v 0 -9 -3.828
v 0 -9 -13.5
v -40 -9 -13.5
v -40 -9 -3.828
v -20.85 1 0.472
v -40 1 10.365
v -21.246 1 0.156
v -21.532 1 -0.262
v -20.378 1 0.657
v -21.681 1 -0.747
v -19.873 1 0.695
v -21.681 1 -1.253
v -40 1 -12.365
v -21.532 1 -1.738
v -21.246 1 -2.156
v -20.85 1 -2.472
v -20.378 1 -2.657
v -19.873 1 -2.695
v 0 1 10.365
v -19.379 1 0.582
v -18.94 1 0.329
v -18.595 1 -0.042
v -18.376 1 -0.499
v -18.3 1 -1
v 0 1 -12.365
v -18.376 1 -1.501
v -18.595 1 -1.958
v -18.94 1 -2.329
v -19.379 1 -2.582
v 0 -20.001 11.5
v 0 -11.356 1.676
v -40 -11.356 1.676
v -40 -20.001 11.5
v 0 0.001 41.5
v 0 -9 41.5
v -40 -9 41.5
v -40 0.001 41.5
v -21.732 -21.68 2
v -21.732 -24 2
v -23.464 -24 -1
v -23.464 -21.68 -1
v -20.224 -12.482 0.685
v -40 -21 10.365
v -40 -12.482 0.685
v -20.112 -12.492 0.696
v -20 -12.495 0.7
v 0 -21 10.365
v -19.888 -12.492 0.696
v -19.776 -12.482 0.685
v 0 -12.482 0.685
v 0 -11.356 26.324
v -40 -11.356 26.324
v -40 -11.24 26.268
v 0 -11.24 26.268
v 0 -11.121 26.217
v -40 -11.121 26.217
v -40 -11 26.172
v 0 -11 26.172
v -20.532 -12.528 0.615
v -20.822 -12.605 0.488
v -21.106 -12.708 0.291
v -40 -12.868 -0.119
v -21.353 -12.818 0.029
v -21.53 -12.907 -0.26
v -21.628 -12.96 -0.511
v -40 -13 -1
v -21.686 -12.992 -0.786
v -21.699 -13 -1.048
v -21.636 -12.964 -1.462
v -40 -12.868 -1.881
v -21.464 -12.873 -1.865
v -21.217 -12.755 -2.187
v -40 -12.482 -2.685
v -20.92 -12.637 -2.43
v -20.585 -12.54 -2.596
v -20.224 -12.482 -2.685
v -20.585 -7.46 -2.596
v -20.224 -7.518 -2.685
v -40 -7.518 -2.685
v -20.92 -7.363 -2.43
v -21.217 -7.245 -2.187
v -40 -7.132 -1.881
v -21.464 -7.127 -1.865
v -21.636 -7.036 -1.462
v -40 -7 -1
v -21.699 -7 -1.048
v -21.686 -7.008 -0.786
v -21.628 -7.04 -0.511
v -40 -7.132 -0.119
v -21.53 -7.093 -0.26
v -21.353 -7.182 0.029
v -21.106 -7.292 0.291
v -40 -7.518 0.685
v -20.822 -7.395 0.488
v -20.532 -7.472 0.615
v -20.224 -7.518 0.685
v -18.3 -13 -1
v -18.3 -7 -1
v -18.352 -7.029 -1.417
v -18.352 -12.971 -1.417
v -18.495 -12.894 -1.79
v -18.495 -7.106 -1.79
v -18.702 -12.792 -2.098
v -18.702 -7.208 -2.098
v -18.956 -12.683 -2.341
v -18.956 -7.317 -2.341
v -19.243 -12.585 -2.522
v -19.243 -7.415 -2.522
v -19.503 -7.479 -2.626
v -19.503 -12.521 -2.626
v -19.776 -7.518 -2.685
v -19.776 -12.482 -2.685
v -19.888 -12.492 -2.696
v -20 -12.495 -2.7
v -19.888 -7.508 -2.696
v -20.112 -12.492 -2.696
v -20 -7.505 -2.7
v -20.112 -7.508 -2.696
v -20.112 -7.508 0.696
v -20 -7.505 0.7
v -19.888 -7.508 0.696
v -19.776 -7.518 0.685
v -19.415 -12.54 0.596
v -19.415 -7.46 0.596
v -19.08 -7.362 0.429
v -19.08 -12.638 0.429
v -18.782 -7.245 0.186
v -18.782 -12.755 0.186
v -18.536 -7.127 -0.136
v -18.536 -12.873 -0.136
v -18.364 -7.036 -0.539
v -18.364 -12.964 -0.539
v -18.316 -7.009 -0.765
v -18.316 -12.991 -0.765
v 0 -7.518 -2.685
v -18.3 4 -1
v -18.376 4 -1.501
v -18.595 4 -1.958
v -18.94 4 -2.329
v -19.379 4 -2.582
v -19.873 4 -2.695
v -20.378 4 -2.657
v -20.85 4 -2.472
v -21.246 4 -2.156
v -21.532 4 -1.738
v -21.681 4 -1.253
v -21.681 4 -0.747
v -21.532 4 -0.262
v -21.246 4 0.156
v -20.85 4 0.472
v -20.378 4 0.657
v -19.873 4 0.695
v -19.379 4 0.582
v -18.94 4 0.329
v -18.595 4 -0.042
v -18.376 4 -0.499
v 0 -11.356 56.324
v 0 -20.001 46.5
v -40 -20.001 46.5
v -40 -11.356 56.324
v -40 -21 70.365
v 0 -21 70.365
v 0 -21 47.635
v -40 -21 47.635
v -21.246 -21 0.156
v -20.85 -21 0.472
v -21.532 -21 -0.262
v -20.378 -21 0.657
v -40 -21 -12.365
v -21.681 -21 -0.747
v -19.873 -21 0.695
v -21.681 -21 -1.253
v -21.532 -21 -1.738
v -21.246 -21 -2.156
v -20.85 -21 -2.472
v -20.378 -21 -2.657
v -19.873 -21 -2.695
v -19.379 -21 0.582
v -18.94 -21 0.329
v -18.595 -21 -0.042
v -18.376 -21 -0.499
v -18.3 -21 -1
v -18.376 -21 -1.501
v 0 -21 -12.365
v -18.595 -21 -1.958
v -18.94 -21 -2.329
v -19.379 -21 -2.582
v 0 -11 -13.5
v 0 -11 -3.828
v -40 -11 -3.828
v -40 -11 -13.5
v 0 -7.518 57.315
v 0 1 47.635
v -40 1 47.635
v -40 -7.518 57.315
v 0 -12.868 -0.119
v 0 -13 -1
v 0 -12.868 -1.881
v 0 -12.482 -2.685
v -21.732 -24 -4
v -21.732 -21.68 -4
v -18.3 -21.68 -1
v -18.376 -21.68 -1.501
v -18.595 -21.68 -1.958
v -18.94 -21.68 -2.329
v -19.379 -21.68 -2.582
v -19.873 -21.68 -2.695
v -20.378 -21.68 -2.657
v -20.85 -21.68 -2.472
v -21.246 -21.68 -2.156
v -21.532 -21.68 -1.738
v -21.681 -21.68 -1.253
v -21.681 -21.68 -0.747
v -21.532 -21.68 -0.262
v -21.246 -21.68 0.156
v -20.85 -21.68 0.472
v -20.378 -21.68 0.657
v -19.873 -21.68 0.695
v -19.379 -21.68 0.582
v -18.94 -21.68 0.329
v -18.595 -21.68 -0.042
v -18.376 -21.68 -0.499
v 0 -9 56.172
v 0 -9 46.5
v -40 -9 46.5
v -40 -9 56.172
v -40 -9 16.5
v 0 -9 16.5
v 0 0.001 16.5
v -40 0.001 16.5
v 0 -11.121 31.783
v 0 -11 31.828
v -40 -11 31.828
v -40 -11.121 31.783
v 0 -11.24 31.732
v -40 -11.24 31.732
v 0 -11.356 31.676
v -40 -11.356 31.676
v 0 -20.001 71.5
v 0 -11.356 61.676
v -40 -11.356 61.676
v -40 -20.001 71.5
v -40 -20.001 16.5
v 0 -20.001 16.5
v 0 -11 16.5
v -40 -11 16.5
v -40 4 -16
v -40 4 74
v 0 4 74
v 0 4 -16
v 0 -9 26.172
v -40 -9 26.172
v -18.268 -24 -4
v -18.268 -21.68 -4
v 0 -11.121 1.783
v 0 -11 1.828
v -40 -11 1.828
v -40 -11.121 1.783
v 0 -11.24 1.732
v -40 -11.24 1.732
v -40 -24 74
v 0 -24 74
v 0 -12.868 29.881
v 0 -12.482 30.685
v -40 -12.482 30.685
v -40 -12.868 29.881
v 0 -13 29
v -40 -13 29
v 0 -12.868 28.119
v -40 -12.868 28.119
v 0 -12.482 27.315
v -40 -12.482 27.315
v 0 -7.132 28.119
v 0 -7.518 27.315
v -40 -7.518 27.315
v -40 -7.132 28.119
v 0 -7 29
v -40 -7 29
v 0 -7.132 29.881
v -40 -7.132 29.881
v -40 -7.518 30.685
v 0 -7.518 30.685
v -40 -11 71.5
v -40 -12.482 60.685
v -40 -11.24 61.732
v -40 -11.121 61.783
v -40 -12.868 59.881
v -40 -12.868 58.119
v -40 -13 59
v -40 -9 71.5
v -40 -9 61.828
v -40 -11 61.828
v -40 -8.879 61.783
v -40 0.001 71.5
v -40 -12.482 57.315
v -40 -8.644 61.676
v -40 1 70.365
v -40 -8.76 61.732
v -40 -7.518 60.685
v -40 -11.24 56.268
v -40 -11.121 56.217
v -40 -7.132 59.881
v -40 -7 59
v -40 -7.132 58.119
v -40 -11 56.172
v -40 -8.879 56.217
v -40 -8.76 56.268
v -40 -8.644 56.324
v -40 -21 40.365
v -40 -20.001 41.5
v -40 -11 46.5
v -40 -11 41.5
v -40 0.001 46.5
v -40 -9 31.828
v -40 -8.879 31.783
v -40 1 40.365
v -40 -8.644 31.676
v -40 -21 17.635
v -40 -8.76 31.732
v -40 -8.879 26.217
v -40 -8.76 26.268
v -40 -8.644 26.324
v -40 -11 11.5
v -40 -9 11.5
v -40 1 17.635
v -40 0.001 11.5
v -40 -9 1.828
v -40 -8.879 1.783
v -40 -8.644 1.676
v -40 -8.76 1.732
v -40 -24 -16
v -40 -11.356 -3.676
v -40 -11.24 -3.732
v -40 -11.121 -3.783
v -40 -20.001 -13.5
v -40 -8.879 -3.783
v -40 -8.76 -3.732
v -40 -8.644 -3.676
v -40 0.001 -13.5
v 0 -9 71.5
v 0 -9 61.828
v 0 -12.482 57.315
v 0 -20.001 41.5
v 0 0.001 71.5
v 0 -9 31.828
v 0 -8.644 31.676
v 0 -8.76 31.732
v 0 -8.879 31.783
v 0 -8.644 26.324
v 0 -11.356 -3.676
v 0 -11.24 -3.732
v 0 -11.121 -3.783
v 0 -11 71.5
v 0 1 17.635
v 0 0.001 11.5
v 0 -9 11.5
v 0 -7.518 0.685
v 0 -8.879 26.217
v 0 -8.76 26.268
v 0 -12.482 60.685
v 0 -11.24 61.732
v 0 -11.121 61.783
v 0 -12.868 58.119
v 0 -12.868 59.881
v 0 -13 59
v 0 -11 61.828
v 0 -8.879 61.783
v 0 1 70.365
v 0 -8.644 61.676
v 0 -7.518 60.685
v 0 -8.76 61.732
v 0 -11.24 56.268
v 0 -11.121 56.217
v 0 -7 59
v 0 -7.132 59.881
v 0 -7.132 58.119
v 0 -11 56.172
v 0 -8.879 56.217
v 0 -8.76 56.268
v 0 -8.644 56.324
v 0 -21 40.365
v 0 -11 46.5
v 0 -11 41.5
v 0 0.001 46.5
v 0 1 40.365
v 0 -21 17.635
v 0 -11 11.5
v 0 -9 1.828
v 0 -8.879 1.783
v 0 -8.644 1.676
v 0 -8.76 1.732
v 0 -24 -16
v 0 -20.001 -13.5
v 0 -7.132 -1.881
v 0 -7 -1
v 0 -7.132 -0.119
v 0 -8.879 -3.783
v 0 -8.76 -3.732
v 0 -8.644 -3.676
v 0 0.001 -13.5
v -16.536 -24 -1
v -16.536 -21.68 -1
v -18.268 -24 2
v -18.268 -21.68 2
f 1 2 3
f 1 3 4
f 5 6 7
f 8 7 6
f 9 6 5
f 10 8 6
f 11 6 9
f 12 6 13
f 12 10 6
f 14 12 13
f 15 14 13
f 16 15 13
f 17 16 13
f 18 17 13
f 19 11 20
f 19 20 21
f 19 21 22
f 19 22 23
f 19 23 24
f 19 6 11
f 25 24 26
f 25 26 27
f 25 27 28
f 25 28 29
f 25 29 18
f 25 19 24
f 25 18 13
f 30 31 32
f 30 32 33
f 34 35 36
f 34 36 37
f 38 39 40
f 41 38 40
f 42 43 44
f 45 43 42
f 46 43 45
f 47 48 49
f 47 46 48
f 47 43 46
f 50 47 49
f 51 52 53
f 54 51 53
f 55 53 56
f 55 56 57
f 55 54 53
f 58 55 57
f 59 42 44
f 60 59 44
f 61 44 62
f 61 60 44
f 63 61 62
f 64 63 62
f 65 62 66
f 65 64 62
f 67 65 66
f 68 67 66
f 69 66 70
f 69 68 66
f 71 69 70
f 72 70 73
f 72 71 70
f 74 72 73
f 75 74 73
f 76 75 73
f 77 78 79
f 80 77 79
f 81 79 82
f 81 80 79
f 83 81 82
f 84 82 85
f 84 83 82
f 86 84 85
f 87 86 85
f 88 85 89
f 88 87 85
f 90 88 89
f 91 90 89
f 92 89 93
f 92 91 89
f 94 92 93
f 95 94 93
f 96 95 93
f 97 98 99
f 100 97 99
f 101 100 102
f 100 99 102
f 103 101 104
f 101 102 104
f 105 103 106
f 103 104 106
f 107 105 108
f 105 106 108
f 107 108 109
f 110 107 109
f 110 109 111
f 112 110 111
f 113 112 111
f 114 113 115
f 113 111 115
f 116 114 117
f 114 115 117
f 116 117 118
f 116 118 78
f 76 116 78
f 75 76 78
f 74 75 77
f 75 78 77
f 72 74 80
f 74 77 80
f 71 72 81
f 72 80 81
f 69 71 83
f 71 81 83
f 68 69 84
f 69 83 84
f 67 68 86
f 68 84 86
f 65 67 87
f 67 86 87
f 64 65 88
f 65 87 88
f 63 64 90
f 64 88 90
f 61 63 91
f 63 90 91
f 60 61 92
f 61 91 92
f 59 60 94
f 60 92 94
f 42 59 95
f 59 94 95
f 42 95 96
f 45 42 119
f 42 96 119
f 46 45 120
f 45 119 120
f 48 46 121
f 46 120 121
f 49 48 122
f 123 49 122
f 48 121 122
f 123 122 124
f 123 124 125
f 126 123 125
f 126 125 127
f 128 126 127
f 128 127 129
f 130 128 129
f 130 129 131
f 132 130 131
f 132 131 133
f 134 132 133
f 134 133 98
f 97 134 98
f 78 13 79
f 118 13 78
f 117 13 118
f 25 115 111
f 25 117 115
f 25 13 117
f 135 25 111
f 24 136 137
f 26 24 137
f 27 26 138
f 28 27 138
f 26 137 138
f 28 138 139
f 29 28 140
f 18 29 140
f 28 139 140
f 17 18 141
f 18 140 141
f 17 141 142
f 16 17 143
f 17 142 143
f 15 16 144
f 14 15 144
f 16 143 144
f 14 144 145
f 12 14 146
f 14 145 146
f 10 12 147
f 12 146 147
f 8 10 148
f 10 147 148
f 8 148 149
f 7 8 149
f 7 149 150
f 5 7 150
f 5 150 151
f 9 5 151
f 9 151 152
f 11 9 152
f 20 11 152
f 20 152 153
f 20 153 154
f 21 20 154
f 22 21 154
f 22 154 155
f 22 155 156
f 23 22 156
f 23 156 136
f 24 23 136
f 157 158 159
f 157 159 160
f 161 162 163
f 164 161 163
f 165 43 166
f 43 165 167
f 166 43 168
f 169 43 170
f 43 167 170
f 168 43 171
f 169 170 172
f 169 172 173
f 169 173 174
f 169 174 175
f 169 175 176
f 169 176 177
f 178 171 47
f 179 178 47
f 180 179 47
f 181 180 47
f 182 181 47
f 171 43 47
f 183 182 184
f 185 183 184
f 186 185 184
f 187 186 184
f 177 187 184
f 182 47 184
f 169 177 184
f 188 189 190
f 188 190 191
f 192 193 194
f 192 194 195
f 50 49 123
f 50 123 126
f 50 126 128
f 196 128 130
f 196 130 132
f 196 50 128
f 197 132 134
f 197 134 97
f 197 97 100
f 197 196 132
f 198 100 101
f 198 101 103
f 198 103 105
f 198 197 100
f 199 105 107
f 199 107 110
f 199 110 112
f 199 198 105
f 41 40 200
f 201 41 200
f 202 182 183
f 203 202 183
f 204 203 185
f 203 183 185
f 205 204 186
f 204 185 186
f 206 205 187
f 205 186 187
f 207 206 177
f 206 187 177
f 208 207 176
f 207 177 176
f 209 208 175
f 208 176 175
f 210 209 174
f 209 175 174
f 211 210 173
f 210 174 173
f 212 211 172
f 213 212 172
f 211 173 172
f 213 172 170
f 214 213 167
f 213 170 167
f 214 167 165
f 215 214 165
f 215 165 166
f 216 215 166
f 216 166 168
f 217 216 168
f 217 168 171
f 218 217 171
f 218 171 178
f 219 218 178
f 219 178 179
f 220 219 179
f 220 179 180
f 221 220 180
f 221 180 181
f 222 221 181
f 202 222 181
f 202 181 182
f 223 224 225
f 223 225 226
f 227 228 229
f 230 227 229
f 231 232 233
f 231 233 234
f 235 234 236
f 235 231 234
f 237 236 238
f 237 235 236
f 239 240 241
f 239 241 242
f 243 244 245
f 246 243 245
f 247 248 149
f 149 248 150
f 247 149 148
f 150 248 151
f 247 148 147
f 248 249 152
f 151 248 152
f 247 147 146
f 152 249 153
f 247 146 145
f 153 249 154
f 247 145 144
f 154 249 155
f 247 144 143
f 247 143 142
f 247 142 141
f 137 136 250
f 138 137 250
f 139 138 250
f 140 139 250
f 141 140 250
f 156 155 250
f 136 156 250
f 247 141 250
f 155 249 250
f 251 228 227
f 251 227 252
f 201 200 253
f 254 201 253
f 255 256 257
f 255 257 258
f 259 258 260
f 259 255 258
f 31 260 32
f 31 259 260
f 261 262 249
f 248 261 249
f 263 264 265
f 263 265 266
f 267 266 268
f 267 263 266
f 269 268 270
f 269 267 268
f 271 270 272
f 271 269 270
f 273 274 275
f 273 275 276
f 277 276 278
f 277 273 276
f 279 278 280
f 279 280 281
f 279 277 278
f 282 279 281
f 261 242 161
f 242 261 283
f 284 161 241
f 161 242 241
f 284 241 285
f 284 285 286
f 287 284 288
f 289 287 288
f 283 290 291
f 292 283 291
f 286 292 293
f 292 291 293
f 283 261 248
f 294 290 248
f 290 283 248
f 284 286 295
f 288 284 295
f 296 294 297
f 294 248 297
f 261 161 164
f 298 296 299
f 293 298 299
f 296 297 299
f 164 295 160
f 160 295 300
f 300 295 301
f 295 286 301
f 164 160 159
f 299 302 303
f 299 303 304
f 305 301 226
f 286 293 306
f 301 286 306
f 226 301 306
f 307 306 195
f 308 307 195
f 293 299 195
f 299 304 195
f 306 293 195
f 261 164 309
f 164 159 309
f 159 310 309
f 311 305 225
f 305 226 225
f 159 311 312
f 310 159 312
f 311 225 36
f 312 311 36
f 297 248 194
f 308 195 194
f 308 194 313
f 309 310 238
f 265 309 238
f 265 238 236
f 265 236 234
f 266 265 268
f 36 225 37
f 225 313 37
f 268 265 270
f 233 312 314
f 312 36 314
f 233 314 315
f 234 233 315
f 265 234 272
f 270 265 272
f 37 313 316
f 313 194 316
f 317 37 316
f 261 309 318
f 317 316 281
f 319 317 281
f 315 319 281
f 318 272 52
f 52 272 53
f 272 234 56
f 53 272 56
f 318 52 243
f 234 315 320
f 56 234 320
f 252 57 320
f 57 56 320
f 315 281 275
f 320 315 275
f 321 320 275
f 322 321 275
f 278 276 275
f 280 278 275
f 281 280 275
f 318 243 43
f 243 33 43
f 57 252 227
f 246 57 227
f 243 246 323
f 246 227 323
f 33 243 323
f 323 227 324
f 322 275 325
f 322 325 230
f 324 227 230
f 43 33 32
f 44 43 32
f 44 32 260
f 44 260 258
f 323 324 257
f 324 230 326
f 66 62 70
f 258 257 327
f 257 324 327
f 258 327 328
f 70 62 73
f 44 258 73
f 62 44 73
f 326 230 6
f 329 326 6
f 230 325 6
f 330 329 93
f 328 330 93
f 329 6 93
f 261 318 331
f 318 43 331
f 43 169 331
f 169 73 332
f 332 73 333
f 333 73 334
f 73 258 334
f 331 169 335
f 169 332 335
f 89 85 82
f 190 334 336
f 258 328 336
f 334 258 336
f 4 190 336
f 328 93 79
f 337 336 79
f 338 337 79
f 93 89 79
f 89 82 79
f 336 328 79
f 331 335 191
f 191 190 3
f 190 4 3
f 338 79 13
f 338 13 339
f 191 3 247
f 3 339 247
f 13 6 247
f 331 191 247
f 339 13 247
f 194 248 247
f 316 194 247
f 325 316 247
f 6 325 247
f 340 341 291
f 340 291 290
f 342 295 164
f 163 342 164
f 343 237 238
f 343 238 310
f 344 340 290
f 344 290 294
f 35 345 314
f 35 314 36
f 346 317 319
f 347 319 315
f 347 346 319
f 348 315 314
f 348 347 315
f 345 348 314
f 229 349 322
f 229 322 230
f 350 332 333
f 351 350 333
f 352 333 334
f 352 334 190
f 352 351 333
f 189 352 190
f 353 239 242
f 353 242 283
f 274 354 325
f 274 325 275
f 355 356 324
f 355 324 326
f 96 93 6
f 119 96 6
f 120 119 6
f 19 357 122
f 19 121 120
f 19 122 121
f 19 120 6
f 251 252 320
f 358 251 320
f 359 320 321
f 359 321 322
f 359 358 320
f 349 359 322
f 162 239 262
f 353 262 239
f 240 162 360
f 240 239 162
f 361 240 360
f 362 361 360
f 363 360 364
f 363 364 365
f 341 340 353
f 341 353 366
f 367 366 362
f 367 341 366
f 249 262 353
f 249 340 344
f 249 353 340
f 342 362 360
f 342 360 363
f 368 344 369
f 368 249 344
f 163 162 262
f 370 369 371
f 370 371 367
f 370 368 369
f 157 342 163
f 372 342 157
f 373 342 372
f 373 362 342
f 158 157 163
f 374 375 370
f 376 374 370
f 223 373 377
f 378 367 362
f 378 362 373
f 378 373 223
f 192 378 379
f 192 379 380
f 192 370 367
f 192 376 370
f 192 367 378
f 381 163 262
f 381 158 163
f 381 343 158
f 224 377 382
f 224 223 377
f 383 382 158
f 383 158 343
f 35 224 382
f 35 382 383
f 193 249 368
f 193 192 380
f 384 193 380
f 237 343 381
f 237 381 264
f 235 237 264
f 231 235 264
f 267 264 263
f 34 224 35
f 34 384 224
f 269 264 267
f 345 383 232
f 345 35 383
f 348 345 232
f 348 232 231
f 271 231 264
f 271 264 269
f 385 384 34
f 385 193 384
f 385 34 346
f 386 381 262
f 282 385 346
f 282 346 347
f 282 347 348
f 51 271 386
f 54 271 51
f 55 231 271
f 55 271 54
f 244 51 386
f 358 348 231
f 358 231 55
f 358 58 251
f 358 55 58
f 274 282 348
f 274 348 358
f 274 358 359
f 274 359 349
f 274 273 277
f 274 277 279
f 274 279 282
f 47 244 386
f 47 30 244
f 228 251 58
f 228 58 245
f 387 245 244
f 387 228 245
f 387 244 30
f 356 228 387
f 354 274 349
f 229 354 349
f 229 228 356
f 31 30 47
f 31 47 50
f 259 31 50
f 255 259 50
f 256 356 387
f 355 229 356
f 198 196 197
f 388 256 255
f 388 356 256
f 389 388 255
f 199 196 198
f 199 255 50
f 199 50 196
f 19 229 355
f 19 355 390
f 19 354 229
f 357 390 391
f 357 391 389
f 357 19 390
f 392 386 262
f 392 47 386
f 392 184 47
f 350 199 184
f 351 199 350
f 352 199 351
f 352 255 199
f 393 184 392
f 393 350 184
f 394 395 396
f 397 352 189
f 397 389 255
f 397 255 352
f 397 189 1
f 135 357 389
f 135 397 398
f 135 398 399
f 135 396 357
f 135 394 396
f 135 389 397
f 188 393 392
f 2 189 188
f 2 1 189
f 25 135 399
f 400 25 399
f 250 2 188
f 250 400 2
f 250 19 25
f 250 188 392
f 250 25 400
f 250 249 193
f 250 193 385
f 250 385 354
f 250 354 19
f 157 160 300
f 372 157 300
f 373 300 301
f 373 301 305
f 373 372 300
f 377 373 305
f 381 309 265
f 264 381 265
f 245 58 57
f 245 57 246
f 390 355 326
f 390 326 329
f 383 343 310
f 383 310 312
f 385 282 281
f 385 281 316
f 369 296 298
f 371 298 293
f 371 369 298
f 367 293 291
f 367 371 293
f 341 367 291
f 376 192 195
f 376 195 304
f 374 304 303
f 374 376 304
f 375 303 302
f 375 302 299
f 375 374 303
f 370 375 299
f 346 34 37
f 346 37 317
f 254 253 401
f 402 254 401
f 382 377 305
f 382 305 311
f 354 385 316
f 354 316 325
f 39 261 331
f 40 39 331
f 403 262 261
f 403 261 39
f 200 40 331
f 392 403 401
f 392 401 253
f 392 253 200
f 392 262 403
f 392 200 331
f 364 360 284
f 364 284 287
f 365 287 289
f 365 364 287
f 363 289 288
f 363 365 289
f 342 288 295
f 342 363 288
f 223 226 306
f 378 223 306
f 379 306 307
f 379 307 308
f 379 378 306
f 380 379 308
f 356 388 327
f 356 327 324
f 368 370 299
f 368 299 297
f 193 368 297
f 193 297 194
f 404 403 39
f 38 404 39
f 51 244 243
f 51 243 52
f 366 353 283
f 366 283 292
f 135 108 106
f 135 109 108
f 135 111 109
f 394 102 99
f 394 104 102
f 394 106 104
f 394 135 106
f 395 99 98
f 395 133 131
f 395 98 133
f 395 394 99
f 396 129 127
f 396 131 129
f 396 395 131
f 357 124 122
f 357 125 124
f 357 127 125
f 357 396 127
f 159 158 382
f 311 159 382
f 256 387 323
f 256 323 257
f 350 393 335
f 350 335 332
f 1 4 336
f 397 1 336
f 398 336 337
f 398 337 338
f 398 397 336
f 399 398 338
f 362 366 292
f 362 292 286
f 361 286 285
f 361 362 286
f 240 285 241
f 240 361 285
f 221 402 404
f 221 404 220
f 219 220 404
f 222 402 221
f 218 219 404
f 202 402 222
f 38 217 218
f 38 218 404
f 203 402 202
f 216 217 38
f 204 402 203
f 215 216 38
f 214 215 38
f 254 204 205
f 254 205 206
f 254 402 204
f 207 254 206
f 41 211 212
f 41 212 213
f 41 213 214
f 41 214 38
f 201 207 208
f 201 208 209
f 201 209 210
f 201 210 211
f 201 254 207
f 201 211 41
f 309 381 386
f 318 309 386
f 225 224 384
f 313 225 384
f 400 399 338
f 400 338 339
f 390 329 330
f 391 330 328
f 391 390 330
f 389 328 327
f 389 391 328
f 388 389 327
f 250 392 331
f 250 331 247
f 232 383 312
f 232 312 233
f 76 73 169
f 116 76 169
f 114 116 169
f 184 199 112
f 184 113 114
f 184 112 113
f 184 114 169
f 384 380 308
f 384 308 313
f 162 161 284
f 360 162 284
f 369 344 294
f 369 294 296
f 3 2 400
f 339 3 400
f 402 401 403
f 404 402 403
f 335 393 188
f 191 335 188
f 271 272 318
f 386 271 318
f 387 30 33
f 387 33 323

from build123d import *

# Parameters (mm, degrees)
SKETCH19_W          = 30
SKETCH19_H          = 28
SKETCH19_W_2        = 25
SKETCH19_H_2        = 22
BOSS_EXTRUDE1_DEPTH = 40
BOSS_EXTRUDE2_DEPTH = 40
LPATTERN2_COUNT     = 3
LPATTERN2_PITCH     = 30
SKETCH22_R          = 1.7
CUT_EXTRUDE1_DEPTH  = 29
CUT_EXTRUDE2_DEPTH  = 2.32


with BuildPart() as part:
    # Sketch19 → Boss-Extrude1 (new body)
    with BuildSketch(Plane(origin=(0, 0, 0), x_dir=(0, 0, -1), z_dir=(1, 0, 0))):
        with Locations((1, -10)):
            Rectangle(SKETCH19_W, SKETCH19_H)
        with Locations((1, -10)):
            Rectangle(SKETCH19_W_2, SKETCH19_H_2, mode=Mode.SUBTRACT)
    extrude(amount=-BOSS_EXTRUDE1_DEPTH)

    # Sketch21 → Boss-Extrude2 (add)
    with BuildSketch(Plane(origin=(0, 0, 0), x_dir=(0, 0, -1), z_dir=(1, 0, 0))):
        with BuildLine():
            Line((-11.995470921, 0.436964862), (-1.676096633, -8.644084511))
            ThreePointArc((-1.676096633, -8.644084511), (-1.252140551, -8.018116315), (-0.68515479, -7.518014236))
            Line((-0.68515479, -7.518014236), (-11.004529079, 1.563035138))
            Line((-11.004529079, 1.563035138), (-11.995470921, 0.436964862))
        make_face()
        with BuildLine():
            Line((13.004529079, 1.563035138), (2.68515479, -7.518014236))
            ThreePointArc((2.68515479, -7.518014236), (3.252140551, -8.018116315), (3.676096633, -8.644084511))
            Line((3.676096633, -8.644084511), (13.995470921, 0.436964862))
            Line((13.995470921, 0.436964862), (13.004529079, 1.563035138))
        make_face()
        with BuildLine():
            Line((-1.828427125, -9), (-11.5, -9))
            Line((-11.5, -9), (-11.5, -11))
            Line((-11.5, -11), (-1.828427125, -11))
            ThreePointArc((-1.828427125, -11), (-2, -10), (-1.828427125, -9))
        make_face()
        with BuildLine():
            Line((13.5, -9), (3.828427125, -9))
            ThreePointArc((3.828427125, -9), (3.956795679, -9.492694064), (4, -10))
            ThreePointArc((4, -10), (3.956795679, -10.507305936), (3.828427125, -11))
            Line((3.828427125, -11), (13.5, -11))
            Line((13.5, -11), (13.5, -9))
        make_face()
        with BuildLine():
            ThreePointArc((-0.68515479, -12.481985764), (-1.252140551, -11.981883685), (-1.676096633, -11.355915489))
            Line((-1.676096633, -11.355915489), (-11.995470921, -20.436964862))
            Line((-11.995470921, -20.436964862), (-11.004529079, -21.563035138))
            Line((-11.004529079, -21.563035138), (-0.68515479, -12.481985764))
        make_face()
        with BuildLine():
            ThreePointArc((3.676096633, -11.355915489), (3.252140551, -11.981883685), (2.68515479, -12.481985764))
            Line((2.68515479, -12.481985764), (13.004529079, -21.563035138))
            Line((13.004529079, -21.563035138), (13.995470921, -20.436964862))
            Line((13.995470921, -20.436964862), (3.676096633, -11.355915489))
        make_face()
        with BuildLine():
            Line((-1.271647214, -9), (-1.828427125, -9))
            ThreePointArc((-1.828427125, -9), (-2, -10), (-1.828427125, -11))
            Line((-1.828427125, -11), (-1.271647214, -11))
            Line((-1.271647214, -11), (-0.135283578, -10))
            Line((-0.135283578, -10), (-1.271647214, -9))
        make_face()
        with BuildLine():
            Line((3.828427125, -9), (3.271647214, -9))
            Line((3.271647214, -9), (2.135283578, -10))
            Line((2.135283578, -10), (3.271647214, -11))
            Line((3.271647214, -11), (3.828427125, -11))
            ThreePointArc((3.828427125, -11), (3.956795679, -10.507305936), (4, -10))
            ThreePointArc((4, -10), (3.956795679, -9.492694064), (3.828427125, -9))
        make_face()
        with BuildLine():
            ThreePointArc((-1.676096633, -8.644084511), (-1.758009138, -8.81958245), (-1.828427125, -9))
            Line((-1.828427125, -9), (-1.271647214, -9))
            Line((-1.271647214, -9), (-1.676096633, -8.644084511))
        make_face()
        with BuildLine():
            Line((-1.676096633, -8.644084511), (-1.271647214, -9))
            Line((-1.271647214, -9), (0.998919941, -9))
            Line((0.998919941, -9), (-0.68515479, -7.518014236))
            ThreePointArc((-0.68515479, -7.518014236), (-1.252140551, -8.018116315), (-1.676096633, -8.644084511))
        make_face()
        Polygon((0.998919941, -9), (-1.271647214, -9), (-0.135283578, -10), (1, -9.000950452), align=None)
        with BuildLine():
            Line((-1.271647214, -11), (-1.828427125, -11))
            ThreePointArc((-1.828427125, -11), (-1.758009138, -11.18041755), (-1.676096633, -11.355915489))
            Line((-1.676096633, -11.355915489), (-1.271647214, -11))
        make_face()
        with BuildLine():
            Line((-0.68515479, -7.518014236), (0.998919941, -9))
            Line((0.998919941, -9), (1.001080059, -9))
            Line((1.001080059, -9), (2.68515479, -7.518014236))
            ThreePointArc((2.68515479, -7.518014236), (1, -7), (-0.68515479, -7.518014236))
        make_face()
        Polygon((1.001080059, -9), (0.998919941, -9), (1, -9.000950452), align=None)
        Polygon((1, -10.999049548), (-0.135283578, -10), (-1.271647214, -11), (0.998919941, -11), align=None)
        Polygon((1, -9.000950452), (-0.135283578, -10), (1, -10.999049548), (2.135283578, -10), align=None)
        with BuildLine():
            Line((0.998919941, -11), (-1.271647214, -11))
            Line((-1.271647214, -11), (-1.676096633, -11.355915489))
            ThreePointArc((-1.676096633, -11.355915489), (-1.252140551, -11.981883685), (-0.68515479, -12.481985764))
            Line((-0.68515479, -12.481985764), (0.998919941, -11))
        make_face()
        with BuildLine():
            Line((2.68515479, -7.518014236), (1.001080059, -9))
            Line((1.001080059, -9), (3.271647214, -9))
            Line((3.271647214, -9), (3.676096633, -8.644084511))
            ThreePointArc((3.676096633, -8.644084511), (3.252140551, -8.018116315), (2.68515479, -7.518014236))
        make_face()
        Polygon((3.271647214, -9), (1.001080059, -9), (1, -9.000950452), (2.135283578, -10), align=None)
        Polygon((1.001080059, -11), (1, -10.999049548), (0.998919941, -11), align=None)
        Polygon((2.135283578, -10), (1, -10.999049548), (1.001080059, -11), (3.271647214, -11), align=None)
        with BuildLine():
            Line((1.001080059, -11), (0.998919941, -11))
            Line((0.998919941, -11), (-0.68515479, -12.481985764))
            ThreePointArc((-0.68515479, -12.481985764), (1, -13), (2.68515479, -12.481985764))
            Line((2.68515479, -12.481985764), (1.001080059, -11))
        make_face()
        with BuildLine():
            Line((3.676096633, -8.644084511), (3.271647214, -9))
            Line((3.271647214, -9), (3.828427125, -9))
            ThreePointArc((3.828427125, -9), (3.758009138, -8.81958245), (3.676096633, -8.644084511))
        make_face()
        with BuildLine():
            Line((3.271647214, -11), (1.001080059, -11))
            Line((1.001080059, -11), (2.68515479, -12.481985764))
            ThreePointArc((2.68515479, -12.481985764), (3.252140551, -11.981883685), (3.676096633, -11.355915489))
            Line((3.676096633, -11.355915489), (3.271647214, -11))
        make_face()
        with BuildLine():
            Line((3.828427125, -11), (3.271647214, -11))
            Line((3.271647214, -11), (3.676096633, -11.355915489))
            ThreePointArc((3.676096633, -11.355915489), (3.758009138, -11.18041755), (3.828427125, -11))
        make_face()
    extrude(amount=-BOSS_EXTRUDE2_DEPTH)


with BuildPart() as lpattern2_1:
    # LPattern2: pattern copy
    add(part.part.moved(Location(Vector(0, 0, 1) * (1 * LPATTERN2_PITCH))))


with BuildPart() as lpattern2_2:
    # LPattern2: pattern copy
    add(part.part.moved(Location(Vector(0, 0, 1) * (2 * LPATTERN2_PITCH))))


with BuildPart() as part_1:
    add(part.part)

    # Sketch22 → Cut-Extrude1 (cut, through all)
    with BuildSketch(Plane(origin=(0, 4, 0), x_dir=(1, 0, 0), z_dir=(0, 1, 0))):
        with Locations((-20, 1)):
            Circle(SKETCH22_R)
    extrude(amount=-CUT_EXTRUDE1_DEPTH, mode=Mode.SUBTRACT)

    # Sketch32 → Cut-Extrude2 (cut)
    with BuildSketch(Plane(origin=(0, -24, 0), x_dir=(-1, 0, 0), z_dir=(0, -1, 0))):
        Polygon((16.535898385, 1), (18.267949192, -2), (21.732050808, -2), (23.464101615, 1), (21.732050808, 4), (18.267949192, 4), align=None)
    extrude(amount=-CUT_EXTRUDE2_DEPTH, mode=Mode.SUBTRACT)

    # Combine1: union LPattern2_1, LPattern2_2
    add(lpattern2_1.part)
    add(lpattern2_2.part)


solid = part_1.part
